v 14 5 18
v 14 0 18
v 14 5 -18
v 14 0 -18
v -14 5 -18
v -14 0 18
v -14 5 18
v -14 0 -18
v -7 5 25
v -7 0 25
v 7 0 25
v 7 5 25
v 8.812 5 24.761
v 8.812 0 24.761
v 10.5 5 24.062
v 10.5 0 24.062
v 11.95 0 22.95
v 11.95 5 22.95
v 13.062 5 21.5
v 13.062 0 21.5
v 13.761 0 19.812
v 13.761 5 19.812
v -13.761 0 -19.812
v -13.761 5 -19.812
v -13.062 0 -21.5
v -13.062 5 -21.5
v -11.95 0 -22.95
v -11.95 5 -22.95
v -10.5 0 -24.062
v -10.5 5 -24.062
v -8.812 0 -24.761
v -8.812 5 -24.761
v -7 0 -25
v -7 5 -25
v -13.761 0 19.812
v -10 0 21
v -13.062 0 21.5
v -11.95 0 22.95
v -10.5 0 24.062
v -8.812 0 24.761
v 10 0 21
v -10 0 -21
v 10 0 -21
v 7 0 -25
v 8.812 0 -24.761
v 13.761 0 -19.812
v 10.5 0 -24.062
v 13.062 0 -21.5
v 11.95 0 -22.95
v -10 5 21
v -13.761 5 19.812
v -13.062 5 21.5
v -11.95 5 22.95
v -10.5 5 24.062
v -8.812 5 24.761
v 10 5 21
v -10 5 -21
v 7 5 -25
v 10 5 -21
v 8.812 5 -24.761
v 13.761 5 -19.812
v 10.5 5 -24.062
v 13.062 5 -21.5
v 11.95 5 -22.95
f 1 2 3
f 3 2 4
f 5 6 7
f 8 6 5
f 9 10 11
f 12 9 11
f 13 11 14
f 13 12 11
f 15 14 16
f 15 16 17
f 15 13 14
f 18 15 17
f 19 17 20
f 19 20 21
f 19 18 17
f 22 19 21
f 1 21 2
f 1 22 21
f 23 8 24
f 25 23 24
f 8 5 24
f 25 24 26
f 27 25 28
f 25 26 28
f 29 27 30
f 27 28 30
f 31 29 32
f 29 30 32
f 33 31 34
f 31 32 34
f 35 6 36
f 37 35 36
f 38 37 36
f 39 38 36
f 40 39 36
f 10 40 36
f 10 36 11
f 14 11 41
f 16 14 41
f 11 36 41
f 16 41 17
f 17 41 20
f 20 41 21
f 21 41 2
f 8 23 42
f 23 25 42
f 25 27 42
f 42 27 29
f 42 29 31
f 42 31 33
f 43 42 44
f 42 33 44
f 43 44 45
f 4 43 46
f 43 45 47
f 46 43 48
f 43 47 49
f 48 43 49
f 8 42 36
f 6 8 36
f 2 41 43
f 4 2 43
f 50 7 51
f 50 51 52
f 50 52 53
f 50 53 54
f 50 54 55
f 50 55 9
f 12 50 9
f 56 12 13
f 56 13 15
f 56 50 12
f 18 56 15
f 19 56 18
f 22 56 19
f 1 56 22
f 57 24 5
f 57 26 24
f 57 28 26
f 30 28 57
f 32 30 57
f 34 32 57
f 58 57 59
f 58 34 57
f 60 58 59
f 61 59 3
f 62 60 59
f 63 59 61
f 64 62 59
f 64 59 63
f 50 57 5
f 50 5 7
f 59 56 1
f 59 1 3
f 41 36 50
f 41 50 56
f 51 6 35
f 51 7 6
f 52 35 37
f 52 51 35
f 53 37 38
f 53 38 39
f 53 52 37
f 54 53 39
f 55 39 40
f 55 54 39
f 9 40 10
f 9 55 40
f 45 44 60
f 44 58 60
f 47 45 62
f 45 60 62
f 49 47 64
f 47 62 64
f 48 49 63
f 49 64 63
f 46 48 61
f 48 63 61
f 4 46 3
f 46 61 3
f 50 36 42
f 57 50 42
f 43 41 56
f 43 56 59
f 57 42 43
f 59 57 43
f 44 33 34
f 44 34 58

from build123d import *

# Parameters (mm, degrees)
ESQUISSE1_W        = 28
ESQUISSE1_H        = 50
ESQUISSE1_W_2      = 20
ESQUISSE1_H_2      = 42
BOSS_EXTRU_1_DEPTH = 5
CONG_1_R           = 7


with BuildPart() as part:
    # Esquisse1 → Boss.-Extru.1 (new body)
    with BuildSketch(Plane(origin=(0, 0, 0), x_dir=(1, 0, 0), z_dir=(0, 1, 0))):
        Rectangle(ESQUISSE1_W, ESQUISSE1_H)
        Rectangle(ESQUISSE1_W_2, ESQUISSE1_H_2, mode=Mode.SUBTRACT)
    extrude(amount=BOSS_EXTRU_1_DEPTH)

    # Congé1
    cong_1_edges = [part.edges().sort_by_distance(p)[0] for p in [
        (14, 2.5, 25),
        (-14, 2.5, 25),
        (-14, 2.5, -25),
        (14, 2.5, -25),
    ]]
    fillet(cong_1_edges, radius=CONG_1_R)


solid = part.part
